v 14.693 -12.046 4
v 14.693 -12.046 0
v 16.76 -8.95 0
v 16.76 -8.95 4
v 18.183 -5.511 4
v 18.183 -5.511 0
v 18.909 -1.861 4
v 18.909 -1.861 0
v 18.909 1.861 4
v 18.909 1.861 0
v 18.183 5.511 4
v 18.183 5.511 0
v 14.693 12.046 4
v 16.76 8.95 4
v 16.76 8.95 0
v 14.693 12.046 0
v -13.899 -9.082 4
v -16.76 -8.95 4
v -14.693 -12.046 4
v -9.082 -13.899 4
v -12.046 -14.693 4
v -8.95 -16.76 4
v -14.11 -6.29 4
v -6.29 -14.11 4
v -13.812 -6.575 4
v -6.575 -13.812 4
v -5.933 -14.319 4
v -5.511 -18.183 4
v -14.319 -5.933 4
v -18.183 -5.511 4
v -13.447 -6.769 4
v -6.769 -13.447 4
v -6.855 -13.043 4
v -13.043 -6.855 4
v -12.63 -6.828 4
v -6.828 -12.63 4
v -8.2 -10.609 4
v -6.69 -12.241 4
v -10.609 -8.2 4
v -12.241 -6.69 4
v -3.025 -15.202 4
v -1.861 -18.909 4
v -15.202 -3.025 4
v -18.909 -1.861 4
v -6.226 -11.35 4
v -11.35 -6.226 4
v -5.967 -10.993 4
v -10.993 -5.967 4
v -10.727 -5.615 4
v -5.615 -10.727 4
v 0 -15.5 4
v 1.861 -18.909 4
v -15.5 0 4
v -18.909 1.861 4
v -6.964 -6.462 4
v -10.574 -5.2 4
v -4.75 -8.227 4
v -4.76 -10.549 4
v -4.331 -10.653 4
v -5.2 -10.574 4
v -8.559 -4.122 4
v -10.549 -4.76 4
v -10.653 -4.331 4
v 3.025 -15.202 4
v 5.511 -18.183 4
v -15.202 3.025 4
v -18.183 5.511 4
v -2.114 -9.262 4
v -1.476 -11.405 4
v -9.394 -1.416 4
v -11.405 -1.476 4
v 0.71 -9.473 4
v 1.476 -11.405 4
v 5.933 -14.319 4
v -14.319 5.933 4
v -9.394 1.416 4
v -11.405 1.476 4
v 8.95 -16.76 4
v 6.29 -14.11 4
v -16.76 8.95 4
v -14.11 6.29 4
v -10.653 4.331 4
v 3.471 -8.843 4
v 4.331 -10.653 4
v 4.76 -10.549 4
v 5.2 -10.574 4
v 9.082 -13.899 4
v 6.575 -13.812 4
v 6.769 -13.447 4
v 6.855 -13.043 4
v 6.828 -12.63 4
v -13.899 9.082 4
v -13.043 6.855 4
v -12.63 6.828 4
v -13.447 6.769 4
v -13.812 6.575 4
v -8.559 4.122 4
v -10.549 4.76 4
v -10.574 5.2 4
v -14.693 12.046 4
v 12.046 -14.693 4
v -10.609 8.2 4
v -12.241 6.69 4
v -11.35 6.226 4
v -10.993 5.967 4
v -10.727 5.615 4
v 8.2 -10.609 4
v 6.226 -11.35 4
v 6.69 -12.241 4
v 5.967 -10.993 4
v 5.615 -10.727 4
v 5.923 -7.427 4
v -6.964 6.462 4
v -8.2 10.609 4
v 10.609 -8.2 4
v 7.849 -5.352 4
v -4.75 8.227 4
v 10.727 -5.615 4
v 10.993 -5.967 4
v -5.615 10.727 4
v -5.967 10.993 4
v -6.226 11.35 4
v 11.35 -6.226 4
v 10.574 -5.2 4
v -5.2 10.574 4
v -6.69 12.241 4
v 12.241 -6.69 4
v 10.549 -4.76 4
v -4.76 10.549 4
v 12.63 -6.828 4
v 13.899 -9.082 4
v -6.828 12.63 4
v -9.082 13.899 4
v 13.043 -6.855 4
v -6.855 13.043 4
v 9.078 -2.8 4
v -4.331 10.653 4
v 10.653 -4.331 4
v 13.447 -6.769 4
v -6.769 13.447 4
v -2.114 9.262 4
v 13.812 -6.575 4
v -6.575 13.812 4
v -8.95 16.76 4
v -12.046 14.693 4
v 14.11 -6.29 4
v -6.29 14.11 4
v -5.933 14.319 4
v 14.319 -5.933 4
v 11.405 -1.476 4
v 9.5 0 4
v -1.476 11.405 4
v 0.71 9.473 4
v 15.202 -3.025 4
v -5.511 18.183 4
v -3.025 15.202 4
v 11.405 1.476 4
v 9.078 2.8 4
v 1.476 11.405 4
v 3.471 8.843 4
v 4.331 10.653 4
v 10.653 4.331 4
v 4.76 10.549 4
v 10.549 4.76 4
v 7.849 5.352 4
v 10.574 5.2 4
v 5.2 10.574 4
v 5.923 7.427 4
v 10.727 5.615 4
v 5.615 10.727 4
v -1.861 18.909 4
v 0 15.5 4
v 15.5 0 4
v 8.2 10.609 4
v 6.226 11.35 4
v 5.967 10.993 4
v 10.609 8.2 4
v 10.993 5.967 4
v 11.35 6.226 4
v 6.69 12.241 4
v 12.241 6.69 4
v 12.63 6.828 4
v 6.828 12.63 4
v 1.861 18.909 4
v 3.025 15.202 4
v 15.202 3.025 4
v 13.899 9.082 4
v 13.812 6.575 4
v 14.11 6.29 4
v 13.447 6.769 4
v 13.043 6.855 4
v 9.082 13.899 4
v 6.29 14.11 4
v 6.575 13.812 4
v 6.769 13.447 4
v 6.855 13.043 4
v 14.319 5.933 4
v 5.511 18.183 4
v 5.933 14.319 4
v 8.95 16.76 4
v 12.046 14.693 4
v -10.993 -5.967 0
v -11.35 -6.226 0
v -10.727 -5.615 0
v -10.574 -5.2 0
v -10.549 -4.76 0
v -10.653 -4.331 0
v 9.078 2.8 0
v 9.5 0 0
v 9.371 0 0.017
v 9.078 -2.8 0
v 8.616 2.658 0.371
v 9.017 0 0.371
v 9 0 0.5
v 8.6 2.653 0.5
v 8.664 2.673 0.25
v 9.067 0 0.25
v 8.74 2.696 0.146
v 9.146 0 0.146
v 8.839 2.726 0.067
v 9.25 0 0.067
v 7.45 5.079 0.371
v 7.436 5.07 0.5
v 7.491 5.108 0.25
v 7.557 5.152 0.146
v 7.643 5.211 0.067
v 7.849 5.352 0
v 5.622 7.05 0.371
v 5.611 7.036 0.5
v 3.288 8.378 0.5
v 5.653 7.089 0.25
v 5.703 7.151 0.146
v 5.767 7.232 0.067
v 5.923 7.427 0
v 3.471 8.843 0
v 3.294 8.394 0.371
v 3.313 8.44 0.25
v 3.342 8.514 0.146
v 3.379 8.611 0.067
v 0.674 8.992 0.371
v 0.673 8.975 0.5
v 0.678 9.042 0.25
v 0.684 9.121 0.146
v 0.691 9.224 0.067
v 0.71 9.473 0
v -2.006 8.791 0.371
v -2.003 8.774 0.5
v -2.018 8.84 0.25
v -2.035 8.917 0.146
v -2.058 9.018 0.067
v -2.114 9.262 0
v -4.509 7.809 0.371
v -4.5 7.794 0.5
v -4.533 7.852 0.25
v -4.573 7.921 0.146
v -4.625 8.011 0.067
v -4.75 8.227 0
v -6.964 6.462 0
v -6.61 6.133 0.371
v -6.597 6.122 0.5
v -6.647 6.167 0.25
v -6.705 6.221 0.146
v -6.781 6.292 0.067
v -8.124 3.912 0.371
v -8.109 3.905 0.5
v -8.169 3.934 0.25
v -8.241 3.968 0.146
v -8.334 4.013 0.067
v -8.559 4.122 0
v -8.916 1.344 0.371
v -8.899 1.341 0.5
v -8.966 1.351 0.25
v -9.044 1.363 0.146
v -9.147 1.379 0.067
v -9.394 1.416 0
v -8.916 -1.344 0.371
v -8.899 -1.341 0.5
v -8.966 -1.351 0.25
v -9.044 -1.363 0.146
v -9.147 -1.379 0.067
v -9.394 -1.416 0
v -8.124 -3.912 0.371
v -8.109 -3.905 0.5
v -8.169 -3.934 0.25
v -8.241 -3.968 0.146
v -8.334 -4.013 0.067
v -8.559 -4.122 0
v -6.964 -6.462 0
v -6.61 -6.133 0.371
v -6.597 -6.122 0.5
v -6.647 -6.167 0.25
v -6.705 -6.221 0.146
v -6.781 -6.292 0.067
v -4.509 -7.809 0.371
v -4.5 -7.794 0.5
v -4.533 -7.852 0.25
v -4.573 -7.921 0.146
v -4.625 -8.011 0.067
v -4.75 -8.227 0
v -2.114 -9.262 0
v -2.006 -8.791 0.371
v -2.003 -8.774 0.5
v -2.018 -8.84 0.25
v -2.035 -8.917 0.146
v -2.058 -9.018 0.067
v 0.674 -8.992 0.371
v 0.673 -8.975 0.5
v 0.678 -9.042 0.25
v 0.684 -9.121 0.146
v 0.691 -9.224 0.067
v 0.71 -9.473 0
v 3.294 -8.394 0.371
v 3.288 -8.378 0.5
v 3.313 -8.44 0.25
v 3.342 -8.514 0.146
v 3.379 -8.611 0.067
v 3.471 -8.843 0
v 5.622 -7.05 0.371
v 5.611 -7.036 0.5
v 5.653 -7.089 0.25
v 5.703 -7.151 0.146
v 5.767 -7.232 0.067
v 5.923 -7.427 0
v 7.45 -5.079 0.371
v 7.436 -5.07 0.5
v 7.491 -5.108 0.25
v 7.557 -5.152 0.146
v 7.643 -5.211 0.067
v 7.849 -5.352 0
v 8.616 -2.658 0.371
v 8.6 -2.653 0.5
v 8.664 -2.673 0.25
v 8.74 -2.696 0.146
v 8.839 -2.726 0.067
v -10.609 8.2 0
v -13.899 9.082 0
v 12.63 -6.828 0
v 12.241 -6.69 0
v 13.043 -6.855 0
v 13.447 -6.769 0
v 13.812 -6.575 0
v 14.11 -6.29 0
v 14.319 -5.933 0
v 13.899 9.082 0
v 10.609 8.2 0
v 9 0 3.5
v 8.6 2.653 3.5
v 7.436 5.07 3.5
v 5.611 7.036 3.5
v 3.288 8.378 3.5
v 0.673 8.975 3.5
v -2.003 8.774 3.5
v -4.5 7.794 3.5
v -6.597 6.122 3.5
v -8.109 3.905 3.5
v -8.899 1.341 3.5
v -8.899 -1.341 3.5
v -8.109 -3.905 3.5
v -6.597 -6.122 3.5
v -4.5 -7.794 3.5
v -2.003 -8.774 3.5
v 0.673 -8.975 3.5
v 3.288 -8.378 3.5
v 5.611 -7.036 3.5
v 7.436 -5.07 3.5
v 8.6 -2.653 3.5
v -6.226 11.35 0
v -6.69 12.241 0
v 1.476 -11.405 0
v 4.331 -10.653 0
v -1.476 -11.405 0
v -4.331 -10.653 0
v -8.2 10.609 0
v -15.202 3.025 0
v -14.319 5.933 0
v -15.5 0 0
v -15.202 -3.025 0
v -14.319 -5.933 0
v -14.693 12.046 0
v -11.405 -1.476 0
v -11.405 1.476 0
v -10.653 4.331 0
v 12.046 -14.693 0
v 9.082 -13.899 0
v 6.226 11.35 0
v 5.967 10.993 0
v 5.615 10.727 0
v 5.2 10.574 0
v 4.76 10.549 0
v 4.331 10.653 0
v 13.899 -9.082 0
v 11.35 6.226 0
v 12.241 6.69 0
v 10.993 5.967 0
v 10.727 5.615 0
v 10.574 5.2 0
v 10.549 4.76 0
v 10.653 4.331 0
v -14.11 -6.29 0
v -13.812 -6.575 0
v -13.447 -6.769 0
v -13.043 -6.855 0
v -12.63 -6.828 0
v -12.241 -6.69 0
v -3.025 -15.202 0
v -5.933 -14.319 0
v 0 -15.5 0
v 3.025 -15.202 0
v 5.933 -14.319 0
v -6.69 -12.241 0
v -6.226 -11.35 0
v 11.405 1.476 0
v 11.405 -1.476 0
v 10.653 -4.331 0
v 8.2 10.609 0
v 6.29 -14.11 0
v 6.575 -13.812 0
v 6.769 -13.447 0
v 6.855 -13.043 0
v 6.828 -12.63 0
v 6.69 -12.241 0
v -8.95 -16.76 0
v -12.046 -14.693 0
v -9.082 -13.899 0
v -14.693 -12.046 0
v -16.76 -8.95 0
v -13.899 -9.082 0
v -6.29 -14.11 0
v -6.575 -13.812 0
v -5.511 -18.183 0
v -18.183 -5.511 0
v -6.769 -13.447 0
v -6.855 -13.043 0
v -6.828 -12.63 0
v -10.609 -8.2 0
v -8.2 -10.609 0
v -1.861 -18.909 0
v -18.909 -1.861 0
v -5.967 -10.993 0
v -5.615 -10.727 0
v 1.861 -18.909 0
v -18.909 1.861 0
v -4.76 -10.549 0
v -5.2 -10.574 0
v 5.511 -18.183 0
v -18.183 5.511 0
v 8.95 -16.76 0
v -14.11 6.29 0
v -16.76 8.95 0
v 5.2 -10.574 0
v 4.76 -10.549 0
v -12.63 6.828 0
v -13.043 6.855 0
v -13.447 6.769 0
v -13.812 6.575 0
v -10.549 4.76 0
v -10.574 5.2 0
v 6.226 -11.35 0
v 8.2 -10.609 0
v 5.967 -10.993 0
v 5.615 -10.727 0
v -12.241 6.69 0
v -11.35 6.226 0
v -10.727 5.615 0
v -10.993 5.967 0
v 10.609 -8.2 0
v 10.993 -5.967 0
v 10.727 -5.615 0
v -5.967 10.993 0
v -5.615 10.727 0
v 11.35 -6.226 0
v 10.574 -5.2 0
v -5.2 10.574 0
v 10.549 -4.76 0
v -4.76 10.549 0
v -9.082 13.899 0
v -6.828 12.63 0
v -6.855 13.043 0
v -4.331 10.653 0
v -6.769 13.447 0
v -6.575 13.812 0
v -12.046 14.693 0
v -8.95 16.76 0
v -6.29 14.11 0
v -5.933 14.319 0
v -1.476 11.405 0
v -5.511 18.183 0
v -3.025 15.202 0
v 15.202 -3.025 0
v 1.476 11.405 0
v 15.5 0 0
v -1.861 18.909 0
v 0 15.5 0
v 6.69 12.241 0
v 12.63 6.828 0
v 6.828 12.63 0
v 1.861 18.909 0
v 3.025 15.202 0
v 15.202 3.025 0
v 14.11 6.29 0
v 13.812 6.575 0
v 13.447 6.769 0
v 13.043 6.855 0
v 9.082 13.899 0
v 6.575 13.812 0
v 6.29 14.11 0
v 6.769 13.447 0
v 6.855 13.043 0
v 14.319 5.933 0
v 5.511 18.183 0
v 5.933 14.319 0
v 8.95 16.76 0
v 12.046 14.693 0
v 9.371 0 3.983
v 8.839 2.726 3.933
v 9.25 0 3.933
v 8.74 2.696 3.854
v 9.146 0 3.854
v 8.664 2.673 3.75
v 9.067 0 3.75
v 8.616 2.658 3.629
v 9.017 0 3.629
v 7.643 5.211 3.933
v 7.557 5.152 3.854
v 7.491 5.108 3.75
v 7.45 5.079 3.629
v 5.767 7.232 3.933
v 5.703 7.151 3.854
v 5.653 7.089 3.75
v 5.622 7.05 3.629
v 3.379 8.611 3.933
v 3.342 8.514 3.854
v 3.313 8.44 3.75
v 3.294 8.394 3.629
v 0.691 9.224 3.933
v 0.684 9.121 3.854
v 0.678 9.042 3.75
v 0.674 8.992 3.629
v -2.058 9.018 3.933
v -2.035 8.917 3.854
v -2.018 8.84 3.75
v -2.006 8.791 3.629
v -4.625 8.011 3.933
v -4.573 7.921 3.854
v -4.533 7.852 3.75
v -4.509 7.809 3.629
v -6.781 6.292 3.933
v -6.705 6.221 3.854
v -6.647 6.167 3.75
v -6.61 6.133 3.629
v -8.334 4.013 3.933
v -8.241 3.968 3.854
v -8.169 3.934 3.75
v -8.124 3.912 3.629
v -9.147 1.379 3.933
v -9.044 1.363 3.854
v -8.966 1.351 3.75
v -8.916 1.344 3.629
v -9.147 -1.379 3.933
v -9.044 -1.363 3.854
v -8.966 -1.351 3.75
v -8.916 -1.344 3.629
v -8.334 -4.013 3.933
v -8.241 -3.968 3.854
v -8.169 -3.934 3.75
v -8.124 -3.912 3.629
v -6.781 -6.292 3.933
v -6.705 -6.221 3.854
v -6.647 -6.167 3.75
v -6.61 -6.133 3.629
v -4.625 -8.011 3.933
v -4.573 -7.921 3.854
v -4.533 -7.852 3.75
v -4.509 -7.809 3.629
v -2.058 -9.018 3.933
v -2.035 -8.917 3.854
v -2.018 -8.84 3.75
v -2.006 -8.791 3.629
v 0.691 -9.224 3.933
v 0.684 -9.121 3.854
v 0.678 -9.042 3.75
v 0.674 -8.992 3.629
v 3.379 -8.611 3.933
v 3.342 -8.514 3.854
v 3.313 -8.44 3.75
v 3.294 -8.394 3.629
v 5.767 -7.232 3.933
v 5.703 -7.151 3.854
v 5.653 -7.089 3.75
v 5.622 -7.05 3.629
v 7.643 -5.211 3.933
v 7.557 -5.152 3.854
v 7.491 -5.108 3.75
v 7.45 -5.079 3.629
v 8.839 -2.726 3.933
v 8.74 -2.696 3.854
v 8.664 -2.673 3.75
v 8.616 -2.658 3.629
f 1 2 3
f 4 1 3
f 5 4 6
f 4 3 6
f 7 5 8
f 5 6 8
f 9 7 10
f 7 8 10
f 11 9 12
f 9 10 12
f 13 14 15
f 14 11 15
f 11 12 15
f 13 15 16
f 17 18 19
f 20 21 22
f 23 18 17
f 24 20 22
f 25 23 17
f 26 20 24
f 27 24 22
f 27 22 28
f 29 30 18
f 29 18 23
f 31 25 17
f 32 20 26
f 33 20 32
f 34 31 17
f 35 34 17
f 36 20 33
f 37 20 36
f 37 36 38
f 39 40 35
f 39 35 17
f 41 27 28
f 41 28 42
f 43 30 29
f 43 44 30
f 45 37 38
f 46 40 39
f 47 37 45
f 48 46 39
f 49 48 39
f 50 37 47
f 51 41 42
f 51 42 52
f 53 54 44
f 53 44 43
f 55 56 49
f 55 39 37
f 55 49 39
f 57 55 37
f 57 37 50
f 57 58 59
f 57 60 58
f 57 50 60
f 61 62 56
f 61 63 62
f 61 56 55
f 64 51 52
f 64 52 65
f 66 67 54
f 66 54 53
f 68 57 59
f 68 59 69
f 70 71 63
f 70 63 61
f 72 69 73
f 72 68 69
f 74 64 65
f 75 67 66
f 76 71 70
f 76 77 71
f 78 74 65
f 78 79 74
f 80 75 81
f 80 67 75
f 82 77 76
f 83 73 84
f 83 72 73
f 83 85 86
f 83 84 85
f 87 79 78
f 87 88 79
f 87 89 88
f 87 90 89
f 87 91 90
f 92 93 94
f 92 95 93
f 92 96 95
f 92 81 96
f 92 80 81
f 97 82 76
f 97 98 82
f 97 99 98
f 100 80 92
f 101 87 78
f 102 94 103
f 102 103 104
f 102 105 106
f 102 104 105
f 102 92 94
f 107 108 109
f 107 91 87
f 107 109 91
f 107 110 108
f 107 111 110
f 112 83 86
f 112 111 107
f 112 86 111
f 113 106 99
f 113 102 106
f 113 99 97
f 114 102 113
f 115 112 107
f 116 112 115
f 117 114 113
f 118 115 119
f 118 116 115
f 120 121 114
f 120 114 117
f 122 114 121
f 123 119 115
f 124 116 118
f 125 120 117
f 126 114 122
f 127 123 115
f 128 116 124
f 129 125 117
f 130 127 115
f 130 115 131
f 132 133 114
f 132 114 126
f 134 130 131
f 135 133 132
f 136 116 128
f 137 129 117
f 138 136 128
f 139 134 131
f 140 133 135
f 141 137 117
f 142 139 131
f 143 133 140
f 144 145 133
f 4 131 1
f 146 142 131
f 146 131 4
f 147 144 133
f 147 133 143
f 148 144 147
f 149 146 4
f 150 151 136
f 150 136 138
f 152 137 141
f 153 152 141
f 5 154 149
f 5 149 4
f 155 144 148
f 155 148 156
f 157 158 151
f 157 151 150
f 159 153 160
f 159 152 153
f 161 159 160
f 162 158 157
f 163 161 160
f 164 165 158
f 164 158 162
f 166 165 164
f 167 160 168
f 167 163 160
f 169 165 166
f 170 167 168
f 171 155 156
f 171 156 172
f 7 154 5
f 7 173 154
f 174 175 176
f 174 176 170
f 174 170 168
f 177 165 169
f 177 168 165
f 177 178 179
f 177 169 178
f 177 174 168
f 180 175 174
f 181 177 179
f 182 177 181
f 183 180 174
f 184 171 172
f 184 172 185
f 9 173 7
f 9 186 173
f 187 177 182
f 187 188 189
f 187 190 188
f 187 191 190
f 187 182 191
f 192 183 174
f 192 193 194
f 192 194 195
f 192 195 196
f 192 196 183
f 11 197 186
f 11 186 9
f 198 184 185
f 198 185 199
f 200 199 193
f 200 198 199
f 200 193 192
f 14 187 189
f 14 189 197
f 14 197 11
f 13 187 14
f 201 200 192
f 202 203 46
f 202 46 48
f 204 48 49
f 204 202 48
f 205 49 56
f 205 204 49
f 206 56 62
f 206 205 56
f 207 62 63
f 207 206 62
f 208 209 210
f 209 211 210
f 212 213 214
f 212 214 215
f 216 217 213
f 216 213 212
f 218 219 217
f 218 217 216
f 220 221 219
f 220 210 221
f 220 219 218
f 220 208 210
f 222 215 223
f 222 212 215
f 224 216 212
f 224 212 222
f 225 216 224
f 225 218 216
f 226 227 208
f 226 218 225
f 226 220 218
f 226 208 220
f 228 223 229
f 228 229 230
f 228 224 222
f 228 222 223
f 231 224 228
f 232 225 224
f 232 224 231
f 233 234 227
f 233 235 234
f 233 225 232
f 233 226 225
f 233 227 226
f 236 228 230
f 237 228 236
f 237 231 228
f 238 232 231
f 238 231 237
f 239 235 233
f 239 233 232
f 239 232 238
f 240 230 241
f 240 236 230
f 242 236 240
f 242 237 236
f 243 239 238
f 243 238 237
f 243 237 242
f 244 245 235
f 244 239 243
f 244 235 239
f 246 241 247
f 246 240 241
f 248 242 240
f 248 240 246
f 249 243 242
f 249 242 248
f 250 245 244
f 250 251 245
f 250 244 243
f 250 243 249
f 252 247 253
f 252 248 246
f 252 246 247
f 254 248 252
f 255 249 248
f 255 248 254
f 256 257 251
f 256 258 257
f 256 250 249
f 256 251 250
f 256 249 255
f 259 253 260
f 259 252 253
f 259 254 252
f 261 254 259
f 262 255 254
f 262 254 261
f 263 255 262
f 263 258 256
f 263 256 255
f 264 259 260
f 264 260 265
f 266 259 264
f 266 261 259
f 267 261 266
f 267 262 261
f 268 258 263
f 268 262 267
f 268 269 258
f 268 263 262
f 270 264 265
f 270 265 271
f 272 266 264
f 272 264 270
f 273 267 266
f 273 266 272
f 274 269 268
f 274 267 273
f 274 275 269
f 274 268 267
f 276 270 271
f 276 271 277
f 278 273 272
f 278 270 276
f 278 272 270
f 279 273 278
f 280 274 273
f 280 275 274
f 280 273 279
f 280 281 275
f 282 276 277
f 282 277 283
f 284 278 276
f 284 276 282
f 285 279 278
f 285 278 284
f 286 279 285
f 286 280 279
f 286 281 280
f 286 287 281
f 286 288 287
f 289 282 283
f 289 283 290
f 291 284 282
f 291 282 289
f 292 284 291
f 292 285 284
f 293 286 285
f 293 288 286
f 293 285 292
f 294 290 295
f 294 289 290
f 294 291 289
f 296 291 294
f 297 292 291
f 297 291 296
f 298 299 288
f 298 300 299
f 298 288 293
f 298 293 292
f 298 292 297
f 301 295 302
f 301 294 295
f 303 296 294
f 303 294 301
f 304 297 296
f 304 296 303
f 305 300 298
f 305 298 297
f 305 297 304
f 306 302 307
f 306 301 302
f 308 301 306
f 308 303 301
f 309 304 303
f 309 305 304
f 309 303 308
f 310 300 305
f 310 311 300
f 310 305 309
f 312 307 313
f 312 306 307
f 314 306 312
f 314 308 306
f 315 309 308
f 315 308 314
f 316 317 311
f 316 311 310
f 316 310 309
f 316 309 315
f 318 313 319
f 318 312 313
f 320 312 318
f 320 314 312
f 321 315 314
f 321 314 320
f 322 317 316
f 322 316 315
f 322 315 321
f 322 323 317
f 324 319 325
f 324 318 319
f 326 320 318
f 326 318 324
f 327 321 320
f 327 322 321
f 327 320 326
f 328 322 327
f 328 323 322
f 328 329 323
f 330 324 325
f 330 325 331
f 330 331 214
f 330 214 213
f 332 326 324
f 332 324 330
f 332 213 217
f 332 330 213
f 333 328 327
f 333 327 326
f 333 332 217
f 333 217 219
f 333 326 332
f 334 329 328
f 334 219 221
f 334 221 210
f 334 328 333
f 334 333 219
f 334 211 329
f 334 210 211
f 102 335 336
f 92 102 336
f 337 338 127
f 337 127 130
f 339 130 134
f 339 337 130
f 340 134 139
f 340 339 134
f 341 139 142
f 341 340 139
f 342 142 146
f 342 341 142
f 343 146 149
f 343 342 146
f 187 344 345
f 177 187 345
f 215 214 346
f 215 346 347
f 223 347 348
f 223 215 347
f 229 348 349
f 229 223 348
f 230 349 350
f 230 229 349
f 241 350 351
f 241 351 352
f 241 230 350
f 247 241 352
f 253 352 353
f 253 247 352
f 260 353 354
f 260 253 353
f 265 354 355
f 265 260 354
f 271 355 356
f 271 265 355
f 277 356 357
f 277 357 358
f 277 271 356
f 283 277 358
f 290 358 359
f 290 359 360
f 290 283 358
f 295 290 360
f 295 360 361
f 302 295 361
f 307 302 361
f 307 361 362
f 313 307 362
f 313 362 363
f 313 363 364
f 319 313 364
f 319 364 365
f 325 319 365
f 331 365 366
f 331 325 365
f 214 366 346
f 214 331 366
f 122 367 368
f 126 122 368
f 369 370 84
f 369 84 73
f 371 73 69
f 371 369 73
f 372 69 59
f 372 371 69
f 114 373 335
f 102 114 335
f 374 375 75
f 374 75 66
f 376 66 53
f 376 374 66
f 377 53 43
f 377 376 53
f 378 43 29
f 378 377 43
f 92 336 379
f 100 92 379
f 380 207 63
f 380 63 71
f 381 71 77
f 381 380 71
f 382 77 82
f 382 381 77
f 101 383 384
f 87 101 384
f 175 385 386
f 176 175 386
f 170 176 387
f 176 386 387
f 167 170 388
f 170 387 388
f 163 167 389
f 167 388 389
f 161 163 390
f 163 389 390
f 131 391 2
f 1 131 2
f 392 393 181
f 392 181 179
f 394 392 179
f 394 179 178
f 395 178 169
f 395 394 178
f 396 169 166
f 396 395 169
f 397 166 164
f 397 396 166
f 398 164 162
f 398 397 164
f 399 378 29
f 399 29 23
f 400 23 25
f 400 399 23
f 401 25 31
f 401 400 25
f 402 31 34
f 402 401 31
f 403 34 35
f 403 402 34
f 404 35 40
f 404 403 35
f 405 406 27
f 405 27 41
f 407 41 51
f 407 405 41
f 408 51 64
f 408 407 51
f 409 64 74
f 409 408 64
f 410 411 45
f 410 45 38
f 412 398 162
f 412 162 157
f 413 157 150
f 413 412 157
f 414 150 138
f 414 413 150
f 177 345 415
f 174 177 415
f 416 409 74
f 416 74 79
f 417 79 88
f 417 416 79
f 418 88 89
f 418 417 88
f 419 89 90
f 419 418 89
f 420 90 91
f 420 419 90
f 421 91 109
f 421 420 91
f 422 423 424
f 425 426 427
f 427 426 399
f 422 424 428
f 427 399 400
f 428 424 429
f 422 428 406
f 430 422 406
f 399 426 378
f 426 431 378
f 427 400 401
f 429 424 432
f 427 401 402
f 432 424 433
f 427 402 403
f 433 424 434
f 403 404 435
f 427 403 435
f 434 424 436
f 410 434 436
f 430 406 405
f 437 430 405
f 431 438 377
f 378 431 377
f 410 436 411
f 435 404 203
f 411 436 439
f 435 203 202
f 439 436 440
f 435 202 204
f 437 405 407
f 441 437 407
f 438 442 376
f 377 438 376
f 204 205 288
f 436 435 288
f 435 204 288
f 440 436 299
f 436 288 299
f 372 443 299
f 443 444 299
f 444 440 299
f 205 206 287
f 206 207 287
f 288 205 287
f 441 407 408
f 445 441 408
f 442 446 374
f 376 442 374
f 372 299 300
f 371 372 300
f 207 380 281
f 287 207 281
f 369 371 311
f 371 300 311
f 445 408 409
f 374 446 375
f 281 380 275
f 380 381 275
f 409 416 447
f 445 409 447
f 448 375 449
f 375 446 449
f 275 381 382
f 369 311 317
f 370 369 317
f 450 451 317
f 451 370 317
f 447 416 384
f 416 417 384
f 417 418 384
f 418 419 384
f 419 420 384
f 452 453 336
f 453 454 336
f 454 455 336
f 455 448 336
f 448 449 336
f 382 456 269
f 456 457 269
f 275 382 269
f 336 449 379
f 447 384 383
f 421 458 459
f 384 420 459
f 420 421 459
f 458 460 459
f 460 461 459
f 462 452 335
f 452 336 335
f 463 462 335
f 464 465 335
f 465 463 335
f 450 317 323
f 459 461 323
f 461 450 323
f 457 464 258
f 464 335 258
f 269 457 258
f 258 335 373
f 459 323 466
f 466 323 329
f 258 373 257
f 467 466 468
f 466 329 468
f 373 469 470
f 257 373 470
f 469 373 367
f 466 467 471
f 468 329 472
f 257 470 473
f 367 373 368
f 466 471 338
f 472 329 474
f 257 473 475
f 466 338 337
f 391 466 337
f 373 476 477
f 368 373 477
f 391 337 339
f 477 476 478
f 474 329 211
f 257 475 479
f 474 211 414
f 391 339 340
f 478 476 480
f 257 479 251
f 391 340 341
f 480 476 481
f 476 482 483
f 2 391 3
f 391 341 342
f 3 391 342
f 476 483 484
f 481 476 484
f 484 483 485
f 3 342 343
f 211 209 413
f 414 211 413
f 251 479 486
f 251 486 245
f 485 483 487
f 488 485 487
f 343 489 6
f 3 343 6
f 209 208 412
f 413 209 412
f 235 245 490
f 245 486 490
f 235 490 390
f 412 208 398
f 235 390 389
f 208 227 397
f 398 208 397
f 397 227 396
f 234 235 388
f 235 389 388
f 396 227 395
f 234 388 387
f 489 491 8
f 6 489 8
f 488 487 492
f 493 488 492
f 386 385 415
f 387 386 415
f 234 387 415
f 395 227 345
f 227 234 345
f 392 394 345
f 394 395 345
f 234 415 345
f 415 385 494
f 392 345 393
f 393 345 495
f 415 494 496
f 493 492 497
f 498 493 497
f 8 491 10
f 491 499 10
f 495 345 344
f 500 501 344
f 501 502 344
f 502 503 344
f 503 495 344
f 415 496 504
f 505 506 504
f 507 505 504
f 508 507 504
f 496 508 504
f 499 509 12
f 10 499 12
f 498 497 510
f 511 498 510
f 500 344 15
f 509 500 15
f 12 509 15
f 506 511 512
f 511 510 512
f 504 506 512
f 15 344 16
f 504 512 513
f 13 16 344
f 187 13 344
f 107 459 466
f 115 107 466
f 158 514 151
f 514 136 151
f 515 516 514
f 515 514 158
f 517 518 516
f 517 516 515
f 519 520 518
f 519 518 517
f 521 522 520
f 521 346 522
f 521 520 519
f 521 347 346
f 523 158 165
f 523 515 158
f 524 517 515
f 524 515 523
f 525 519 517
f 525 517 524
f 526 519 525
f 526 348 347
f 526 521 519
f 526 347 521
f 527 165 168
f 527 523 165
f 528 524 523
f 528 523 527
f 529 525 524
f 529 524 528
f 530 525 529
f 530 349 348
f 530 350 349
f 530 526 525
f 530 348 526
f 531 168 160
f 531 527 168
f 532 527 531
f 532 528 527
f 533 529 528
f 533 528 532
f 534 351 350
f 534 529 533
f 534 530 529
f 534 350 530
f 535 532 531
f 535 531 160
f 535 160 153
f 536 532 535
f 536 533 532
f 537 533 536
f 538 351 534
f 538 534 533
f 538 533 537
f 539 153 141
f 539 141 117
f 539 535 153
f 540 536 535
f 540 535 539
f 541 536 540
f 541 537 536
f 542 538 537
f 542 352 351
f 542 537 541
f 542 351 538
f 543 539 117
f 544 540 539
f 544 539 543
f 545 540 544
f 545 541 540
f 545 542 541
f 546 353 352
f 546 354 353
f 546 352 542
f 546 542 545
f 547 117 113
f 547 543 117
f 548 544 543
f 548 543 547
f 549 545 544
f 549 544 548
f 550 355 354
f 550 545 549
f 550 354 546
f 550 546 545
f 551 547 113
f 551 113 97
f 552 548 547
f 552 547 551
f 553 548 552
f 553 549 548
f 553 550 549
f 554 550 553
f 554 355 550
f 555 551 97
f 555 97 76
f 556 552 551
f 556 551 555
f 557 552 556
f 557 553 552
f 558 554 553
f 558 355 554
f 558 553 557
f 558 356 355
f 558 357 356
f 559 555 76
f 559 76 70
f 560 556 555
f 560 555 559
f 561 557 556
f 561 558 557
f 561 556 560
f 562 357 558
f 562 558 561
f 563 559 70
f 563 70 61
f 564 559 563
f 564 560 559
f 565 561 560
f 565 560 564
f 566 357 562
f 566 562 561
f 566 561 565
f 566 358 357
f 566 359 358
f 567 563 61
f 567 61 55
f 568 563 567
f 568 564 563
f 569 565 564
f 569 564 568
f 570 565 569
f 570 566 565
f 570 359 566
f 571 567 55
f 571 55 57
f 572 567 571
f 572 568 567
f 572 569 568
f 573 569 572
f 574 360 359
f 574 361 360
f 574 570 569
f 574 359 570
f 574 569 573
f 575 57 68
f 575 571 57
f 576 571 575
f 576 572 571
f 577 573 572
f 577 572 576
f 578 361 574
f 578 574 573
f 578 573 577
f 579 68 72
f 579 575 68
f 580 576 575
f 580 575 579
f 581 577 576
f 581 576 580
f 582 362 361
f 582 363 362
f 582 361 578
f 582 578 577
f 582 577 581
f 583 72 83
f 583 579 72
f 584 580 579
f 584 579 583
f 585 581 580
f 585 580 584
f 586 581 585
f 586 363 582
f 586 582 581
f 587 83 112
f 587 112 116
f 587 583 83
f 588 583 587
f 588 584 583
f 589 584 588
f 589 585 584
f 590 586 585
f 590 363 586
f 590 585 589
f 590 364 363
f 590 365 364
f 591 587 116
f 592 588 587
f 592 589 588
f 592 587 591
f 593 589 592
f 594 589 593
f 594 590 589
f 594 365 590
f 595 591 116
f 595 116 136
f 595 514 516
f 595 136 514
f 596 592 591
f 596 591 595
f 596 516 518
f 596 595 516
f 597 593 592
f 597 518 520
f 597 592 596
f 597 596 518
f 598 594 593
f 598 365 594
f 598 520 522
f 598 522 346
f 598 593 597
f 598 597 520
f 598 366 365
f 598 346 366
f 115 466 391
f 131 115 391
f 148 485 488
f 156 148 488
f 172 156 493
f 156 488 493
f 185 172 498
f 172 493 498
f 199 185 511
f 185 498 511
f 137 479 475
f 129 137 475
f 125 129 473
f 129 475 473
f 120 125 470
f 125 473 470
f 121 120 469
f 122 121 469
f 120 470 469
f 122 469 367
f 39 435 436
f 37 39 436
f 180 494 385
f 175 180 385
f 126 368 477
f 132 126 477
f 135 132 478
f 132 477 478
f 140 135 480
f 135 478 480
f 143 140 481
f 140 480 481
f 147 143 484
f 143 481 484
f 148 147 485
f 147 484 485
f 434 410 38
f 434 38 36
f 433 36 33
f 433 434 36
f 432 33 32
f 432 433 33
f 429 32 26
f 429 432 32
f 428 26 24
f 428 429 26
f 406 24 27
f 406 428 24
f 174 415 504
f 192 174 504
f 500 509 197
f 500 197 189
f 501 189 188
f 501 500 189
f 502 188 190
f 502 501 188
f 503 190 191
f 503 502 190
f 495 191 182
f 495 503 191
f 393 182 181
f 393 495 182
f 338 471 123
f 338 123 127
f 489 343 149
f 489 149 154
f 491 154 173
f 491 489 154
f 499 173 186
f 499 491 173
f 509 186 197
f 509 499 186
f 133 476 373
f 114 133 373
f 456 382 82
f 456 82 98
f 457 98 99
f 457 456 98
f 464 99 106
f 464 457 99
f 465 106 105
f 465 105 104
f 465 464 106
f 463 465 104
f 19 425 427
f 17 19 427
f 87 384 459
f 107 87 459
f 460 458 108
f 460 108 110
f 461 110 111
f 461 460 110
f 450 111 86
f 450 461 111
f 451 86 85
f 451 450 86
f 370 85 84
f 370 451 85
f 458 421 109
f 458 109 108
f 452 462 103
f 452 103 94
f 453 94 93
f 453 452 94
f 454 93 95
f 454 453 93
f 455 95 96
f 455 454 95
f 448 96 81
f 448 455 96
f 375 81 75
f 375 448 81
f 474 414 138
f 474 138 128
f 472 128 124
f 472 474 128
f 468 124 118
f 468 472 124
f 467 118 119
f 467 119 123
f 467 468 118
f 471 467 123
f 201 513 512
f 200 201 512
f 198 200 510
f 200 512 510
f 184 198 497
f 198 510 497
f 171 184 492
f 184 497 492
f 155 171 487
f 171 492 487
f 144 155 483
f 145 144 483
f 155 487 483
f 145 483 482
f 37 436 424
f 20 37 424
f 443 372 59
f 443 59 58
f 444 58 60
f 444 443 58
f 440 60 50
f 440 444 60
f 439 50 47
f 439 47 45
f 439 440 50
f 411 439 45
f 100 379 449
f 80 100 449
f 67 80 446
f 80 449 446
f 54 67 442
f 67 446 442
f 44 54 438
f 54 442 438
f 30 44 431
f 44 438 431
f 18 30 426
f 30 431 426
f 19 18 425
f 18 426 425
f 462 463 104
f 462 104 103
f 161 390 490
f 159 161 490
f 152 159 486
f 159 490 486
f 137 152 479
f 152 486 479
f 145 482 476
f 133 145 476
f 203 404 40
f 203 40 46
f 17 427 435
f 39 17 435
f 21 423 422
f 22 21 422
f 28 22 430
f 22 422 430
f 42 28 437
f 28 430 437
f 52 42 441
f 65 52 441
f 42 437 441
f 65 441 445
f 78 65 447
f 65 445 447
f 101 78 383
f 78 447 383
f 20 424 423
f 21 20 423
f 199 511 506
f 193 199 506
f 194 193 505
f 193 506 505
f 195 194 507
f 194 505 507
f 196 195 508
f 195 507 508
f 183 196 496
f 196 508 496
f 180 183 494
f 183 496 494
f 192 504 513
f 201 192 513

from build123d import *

# Parameters (mm, degrees)
SKETCH1_R           = 19
SKETCH1_R_2         = 9
BOSS_EXTRUDE1_DEPTH = 4
CUT_EXTRUDE1_DEPTH  = 4
FILLET1_R           = 0.5


with BuildPart() as part:
    # Sketch1 → Boss-Extrude1 (new body)
    with BuildSketch(Plane.XY):
        Circle(SKETCH1_R)
        Circle(SKETCH1_R_2, mode=Mode.SUBTRACT)
        with BuildLine():
            Line((6.689691504, 12.241024694), (6.226047976, 11.350373764))
            ThreePointArc((6.226047976, 11.350373764), (5.41320923, 10.635157913), (4.330662681, 10.653420143))
            ThreePointArc((4.330662681, 10.653420143), (0, 11.5), (-4.330662681, 10.653420143))
            ThreePointArc((-4.330662681, 10.653420143), (-5.41320923, 10.635157913), (-6.226047976, 11.350373764))
            Line((-6.226047976, 11.350373764), (-6.689691504, 12.241024694))
            ThreePointArc((-6.689691504, 12.241024694), (-6.768746058, 13.446590252), (-5.933372603, 14.319395572))
            ThreePointArc((-5.933372603, 14.319395572), (0, 15.5), (5.933372603, 14.319395572))
            ThreePointArc((5.933372603, 14.319395572), (6.768746058, 13.446590252), (6.689691504, 12.241024694))
        make_face(mode=Mode.SUBTRACT)
        with BuildLine():
            Line((12.241024694, 6.689691504), (11.350373764, 6.226047976))
            ThreePointArc((11.350373764, 6.226047976), (10.635157913, 5.41320923), (10.653420143, 4.330662681))
            ThreePointArc((10.653420143, 4.330662681), (11.5, 0), (10.653420143, -4.330662681))
            ThreePointArc((10.653420143, -4.330662681), (10.635157913, -5.41320923), (11.350373764, -6.226047976))
            Line((11.350373764, -6.226047976), (12.241024694, -6.689691504))
            ThreePointArc((12.241024694, -6.689691504), (13.446590252, -6.768746058), (14.319395572, -5.933372603))
            ThreePointArc((14.319395572, -5.933372603), (15.5, 0), (14.319395572, 5.933372603))
            ThreePointArc((14.319395572, 5.933372603), (13.446590252, 6.768746058), (12.241024694, 6.689691504))
        make_face(mode=Mode.SUBTRACT)
        with BuildLine():
            Line((6.689691504, -12.241024694), (6.226047976, -11.350373764))
            ThreePointArc((6.226047976, -11.350373764), (5.41320923, -10.635157913), (4.330662681, -10.653420143))
            ThreePointArc((4.330662681, -10.653420143), (0, -11.5), (-4.330662681, -10.653420143))
            ThreePointArc((-4.330662681, -10.653420143), (-5.41320923, -10.635157913), (-6.226047976, -11.350373764))
            Line((-6.226047976, -11.350373764), (-6.689691504, -12.241024694))
            ThreePointArc((-6.689691504, -12.241024694), (-6.768746058, -13.446590252), (-5.933372603, -14.319395572))
            ThreePointArc((-5.933372603, -14.319395572), (0, -15.5), (5.933372603, -14.319395572))
            ThreePointArc((5.933372603, -14.319395572), (6.768746058, -13.446590252), (6.689691504, -12.241024694))
        make_face(mode=Mode.SUBTRACT)
        with BuildLine():
            Line((-12.241024694, -6.689691504), (-11.350373764, -6.226047976))
            ThreePointArc((-11.350373764, -6.226047976), (-10.635157913, -5.41320923), (-10.653420143, -4.330662681))
            ThreePointArc((-10.653420143, -4.330662681), (-11.5, 0), (-10.653420143, 4.330662681))
            ThreePointArc((-10.653420143, 4.330662681), (-10.635157913, 5.41320923), (-11.350373764, 6.226047976))
            Line((-11.350373764, 6.226047976), (-12.241024694, 6.689691504))
            ThreePointArc((-12.241024694, 6.689691504), (-13.446590252, 6.768746058), (-14.319395572, 5.933372603))
            ThreePointArc((-14.319395572, 5.933372603), (-15.5, 0), (-14.319395572, -5.933372603))
            ThreePointArc((-14.319395572, -5.933372603), (-13.446590252, -6.768746058), (-12.241024694, -6.689691504))
        make_face(mode=Mode.SUBTRACT)
    extrude(amount=BOSS_EXTRUDE1_DEPTH)

    # Sketch2 → Cut-Extrude1 (cut)
    with BuildSketch(Plane(origin=(0, 0, 0), x_dir=(-1, 0, 0), z_dir=(0, 0, -1))):
        Polygon((10.608852647, -8.200187733), (8.200187733, -10.608852647), (9.081820281, -13.899150108), (12.372117742, -14.780782656), (14.780782656, -12.372117742), (13.899150108, -9.081820281), align=None)
        Polygon((13.899150108, 9.081820281), (14.780782656, 12.372117742), (12.372117742, 14.780782656), (9.081820281, 13.899150108), (8.200187733, 10.608852647), (10.608852647, 8.200187733), align=None)
        Polygon((-8.200187733, -10.608852647), (-10.608852647, -8.200187733), (-13.899150108, -9.081820281), (-14.780782656, -12.372117742), (-12.372117742, -14.780782656), (-9.081820281, -13.899150108), align=None)
        Polygon((-10.608852647, 8.200187733), (-8.200187733, 10.608852647), (-9.081820281, 13.899150108), (-12.372117742, 14.780782656), (-14.780782656, 12.372117742), (-13.899150108, 9.081820281), align=None)
    extrude(amount=-CUT_EXTRUDE1_DEPTH, mode=Mode.SUBTRACT)

    # Fillet1
    fillet1_edges = [part.edges().sort_by_distance(p)[0] for p in [
        (-9, 0, 0),
        (-9, 0, 4),
    ]]
    fillet(fillet1_edges, radius=FILLET1_R)


solid = part.part
